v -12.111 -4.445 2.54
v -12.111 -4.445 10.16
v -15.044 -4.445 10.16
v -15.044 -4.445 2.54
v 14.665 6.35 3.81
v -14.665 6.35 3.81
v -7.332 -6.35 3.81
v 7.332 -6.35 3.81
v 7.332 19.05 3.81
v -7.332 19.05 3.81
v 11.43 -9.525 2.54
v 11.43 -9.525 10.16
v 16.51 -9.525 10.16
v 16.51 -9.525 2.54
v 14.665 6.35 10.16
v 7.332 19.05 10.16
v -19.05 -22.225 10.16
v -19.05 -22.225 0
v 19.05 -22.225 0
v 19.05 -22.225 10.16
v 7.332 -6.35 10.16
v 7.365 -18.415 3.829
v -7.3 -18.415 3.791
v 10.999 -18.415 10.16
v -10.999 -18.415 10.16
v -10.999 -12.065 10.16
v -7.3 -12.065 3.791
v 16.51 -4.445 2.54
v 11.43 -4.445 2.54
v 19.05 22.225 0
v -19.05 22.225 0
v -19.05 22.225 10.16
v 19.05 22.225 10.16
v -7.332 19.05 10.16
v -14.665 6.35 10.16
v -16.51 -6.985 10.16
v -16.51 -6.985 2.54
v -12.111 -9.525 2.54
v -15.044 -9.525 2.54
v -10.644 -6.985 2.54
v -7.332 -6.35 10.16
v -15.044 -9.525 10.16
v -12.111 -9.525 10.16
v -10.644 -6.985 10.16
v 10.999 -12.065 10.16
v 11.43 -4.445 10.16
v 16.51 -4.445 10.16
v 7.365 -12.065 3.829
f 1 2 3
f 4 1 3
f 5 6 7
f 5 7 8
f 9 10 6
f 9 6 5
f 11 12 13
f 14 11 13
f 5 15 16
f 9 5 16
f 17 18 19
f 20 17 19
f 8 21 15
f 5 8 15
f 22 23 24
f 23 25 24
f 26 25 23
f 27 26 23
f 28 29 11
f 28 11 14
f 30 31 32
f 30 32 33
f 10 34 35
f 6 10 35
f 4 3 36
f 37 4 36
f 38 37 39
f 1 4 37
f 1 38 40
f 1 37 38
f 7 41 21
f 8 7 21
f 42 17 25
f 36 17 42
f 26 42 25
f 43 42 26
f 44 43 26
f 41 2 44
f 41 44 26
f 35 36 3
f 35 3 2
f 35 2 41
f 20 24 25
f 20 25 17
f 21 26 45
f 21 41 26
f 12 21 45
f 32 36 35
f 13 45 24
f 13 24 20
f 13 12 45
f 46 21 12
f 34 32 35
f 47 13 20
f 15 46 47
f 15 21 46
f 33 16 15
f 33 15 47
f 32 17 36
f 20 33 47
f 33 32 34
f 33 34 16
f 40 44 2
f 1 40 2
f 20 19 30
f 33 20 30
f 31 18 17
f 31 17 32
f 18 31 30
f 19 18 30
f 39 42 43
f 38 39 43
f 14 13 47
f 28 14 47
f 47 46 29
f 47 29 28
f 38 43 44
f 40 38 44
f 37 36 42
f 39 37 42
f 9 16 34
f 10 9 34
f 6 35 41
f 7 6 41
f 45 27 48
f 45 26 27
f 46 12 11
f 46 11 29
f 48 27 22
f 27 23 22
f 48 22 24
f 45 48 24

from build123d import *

# Parameters (mm, degrees)
F0_W          = 38.1
F0_H          = 44.45
F1_DEPTH      = 10.16
F3_DEPTH      = 6.35
F6_DEPTH      = 3.175
F6_DEPTH_BACK = 3.175
F8_DEPTH      = 7.62
F9_W          = 5.08
F9_H          = 5.08
F10_DEPTH     = 7.62


with BuildPart() as f1:
    # F0 (on Top) → F1 (new body)
    with BuildSketch(Plane.XY):
        Rectangle(F0_W, F0_H)
    extrude(amount=F1_DEPTH)

    # F2 (on face) → F3 (cut)
    with BuildSketch(Plane.XY.offset(10.16)):
        Polygon((14.6646968374, 6.35), (7.3323484187, 19.05), (-7.3323484187, 19.05), (-14.6646968374, 6.35), (-7.3323484187, -6.35), (7.3323484187, -6.35), align=None)
    extrude(amount=-F3_DEPTH, mode=Mode.SUBTRACT)

    # F5 (on offset) → F6 (cut, two sides)
    with BuildSketch(Plane.XZ.offset(15.24)) as f6_sk:
        Polygon((7.3645809335, 3.8287173206), (14.6646495373, 16.547299463), (7.3000686039, 29.2286353945), (-7.3645809335, 29.1913891837), (-14.6646495373, 16.4728070413), (-7.3000686039, 3.7914711098), align=None)
    extrude(amount=-F6_DEPTH, mode=Mode.SUBTRACT)
    extrude(f6_sk.sketch, amount=F6_DEPTH_BACK, mode=Mode.SUBTRACT)

    # F7 (on face) → F8 (cut)
    with BuildSketch(Plane.XY.offset(10.16)):
        Polygon((-10.644121265, -6.985), (-12.1105909488, -4.445), (-15.0435303163, -4.445), (-16.51, -6.985), (-15.0435303163, -9.525), (-12.1105909488, -9.525), align=None)
    extrude(amount=-F8_DEPTH, mode=Mode.SUBTRACT)

    # F9 (on face) → F10 (cut)
    with BuildSketch(Plane.XY.offset(10.16)):
        with Locations((13.97, -6.985)):
            Rectangle(F9_W, F9_H)
    extrude(amount=-F10_DEPTH, mode=Mode.SUBTRACT)


solid = f1.part
